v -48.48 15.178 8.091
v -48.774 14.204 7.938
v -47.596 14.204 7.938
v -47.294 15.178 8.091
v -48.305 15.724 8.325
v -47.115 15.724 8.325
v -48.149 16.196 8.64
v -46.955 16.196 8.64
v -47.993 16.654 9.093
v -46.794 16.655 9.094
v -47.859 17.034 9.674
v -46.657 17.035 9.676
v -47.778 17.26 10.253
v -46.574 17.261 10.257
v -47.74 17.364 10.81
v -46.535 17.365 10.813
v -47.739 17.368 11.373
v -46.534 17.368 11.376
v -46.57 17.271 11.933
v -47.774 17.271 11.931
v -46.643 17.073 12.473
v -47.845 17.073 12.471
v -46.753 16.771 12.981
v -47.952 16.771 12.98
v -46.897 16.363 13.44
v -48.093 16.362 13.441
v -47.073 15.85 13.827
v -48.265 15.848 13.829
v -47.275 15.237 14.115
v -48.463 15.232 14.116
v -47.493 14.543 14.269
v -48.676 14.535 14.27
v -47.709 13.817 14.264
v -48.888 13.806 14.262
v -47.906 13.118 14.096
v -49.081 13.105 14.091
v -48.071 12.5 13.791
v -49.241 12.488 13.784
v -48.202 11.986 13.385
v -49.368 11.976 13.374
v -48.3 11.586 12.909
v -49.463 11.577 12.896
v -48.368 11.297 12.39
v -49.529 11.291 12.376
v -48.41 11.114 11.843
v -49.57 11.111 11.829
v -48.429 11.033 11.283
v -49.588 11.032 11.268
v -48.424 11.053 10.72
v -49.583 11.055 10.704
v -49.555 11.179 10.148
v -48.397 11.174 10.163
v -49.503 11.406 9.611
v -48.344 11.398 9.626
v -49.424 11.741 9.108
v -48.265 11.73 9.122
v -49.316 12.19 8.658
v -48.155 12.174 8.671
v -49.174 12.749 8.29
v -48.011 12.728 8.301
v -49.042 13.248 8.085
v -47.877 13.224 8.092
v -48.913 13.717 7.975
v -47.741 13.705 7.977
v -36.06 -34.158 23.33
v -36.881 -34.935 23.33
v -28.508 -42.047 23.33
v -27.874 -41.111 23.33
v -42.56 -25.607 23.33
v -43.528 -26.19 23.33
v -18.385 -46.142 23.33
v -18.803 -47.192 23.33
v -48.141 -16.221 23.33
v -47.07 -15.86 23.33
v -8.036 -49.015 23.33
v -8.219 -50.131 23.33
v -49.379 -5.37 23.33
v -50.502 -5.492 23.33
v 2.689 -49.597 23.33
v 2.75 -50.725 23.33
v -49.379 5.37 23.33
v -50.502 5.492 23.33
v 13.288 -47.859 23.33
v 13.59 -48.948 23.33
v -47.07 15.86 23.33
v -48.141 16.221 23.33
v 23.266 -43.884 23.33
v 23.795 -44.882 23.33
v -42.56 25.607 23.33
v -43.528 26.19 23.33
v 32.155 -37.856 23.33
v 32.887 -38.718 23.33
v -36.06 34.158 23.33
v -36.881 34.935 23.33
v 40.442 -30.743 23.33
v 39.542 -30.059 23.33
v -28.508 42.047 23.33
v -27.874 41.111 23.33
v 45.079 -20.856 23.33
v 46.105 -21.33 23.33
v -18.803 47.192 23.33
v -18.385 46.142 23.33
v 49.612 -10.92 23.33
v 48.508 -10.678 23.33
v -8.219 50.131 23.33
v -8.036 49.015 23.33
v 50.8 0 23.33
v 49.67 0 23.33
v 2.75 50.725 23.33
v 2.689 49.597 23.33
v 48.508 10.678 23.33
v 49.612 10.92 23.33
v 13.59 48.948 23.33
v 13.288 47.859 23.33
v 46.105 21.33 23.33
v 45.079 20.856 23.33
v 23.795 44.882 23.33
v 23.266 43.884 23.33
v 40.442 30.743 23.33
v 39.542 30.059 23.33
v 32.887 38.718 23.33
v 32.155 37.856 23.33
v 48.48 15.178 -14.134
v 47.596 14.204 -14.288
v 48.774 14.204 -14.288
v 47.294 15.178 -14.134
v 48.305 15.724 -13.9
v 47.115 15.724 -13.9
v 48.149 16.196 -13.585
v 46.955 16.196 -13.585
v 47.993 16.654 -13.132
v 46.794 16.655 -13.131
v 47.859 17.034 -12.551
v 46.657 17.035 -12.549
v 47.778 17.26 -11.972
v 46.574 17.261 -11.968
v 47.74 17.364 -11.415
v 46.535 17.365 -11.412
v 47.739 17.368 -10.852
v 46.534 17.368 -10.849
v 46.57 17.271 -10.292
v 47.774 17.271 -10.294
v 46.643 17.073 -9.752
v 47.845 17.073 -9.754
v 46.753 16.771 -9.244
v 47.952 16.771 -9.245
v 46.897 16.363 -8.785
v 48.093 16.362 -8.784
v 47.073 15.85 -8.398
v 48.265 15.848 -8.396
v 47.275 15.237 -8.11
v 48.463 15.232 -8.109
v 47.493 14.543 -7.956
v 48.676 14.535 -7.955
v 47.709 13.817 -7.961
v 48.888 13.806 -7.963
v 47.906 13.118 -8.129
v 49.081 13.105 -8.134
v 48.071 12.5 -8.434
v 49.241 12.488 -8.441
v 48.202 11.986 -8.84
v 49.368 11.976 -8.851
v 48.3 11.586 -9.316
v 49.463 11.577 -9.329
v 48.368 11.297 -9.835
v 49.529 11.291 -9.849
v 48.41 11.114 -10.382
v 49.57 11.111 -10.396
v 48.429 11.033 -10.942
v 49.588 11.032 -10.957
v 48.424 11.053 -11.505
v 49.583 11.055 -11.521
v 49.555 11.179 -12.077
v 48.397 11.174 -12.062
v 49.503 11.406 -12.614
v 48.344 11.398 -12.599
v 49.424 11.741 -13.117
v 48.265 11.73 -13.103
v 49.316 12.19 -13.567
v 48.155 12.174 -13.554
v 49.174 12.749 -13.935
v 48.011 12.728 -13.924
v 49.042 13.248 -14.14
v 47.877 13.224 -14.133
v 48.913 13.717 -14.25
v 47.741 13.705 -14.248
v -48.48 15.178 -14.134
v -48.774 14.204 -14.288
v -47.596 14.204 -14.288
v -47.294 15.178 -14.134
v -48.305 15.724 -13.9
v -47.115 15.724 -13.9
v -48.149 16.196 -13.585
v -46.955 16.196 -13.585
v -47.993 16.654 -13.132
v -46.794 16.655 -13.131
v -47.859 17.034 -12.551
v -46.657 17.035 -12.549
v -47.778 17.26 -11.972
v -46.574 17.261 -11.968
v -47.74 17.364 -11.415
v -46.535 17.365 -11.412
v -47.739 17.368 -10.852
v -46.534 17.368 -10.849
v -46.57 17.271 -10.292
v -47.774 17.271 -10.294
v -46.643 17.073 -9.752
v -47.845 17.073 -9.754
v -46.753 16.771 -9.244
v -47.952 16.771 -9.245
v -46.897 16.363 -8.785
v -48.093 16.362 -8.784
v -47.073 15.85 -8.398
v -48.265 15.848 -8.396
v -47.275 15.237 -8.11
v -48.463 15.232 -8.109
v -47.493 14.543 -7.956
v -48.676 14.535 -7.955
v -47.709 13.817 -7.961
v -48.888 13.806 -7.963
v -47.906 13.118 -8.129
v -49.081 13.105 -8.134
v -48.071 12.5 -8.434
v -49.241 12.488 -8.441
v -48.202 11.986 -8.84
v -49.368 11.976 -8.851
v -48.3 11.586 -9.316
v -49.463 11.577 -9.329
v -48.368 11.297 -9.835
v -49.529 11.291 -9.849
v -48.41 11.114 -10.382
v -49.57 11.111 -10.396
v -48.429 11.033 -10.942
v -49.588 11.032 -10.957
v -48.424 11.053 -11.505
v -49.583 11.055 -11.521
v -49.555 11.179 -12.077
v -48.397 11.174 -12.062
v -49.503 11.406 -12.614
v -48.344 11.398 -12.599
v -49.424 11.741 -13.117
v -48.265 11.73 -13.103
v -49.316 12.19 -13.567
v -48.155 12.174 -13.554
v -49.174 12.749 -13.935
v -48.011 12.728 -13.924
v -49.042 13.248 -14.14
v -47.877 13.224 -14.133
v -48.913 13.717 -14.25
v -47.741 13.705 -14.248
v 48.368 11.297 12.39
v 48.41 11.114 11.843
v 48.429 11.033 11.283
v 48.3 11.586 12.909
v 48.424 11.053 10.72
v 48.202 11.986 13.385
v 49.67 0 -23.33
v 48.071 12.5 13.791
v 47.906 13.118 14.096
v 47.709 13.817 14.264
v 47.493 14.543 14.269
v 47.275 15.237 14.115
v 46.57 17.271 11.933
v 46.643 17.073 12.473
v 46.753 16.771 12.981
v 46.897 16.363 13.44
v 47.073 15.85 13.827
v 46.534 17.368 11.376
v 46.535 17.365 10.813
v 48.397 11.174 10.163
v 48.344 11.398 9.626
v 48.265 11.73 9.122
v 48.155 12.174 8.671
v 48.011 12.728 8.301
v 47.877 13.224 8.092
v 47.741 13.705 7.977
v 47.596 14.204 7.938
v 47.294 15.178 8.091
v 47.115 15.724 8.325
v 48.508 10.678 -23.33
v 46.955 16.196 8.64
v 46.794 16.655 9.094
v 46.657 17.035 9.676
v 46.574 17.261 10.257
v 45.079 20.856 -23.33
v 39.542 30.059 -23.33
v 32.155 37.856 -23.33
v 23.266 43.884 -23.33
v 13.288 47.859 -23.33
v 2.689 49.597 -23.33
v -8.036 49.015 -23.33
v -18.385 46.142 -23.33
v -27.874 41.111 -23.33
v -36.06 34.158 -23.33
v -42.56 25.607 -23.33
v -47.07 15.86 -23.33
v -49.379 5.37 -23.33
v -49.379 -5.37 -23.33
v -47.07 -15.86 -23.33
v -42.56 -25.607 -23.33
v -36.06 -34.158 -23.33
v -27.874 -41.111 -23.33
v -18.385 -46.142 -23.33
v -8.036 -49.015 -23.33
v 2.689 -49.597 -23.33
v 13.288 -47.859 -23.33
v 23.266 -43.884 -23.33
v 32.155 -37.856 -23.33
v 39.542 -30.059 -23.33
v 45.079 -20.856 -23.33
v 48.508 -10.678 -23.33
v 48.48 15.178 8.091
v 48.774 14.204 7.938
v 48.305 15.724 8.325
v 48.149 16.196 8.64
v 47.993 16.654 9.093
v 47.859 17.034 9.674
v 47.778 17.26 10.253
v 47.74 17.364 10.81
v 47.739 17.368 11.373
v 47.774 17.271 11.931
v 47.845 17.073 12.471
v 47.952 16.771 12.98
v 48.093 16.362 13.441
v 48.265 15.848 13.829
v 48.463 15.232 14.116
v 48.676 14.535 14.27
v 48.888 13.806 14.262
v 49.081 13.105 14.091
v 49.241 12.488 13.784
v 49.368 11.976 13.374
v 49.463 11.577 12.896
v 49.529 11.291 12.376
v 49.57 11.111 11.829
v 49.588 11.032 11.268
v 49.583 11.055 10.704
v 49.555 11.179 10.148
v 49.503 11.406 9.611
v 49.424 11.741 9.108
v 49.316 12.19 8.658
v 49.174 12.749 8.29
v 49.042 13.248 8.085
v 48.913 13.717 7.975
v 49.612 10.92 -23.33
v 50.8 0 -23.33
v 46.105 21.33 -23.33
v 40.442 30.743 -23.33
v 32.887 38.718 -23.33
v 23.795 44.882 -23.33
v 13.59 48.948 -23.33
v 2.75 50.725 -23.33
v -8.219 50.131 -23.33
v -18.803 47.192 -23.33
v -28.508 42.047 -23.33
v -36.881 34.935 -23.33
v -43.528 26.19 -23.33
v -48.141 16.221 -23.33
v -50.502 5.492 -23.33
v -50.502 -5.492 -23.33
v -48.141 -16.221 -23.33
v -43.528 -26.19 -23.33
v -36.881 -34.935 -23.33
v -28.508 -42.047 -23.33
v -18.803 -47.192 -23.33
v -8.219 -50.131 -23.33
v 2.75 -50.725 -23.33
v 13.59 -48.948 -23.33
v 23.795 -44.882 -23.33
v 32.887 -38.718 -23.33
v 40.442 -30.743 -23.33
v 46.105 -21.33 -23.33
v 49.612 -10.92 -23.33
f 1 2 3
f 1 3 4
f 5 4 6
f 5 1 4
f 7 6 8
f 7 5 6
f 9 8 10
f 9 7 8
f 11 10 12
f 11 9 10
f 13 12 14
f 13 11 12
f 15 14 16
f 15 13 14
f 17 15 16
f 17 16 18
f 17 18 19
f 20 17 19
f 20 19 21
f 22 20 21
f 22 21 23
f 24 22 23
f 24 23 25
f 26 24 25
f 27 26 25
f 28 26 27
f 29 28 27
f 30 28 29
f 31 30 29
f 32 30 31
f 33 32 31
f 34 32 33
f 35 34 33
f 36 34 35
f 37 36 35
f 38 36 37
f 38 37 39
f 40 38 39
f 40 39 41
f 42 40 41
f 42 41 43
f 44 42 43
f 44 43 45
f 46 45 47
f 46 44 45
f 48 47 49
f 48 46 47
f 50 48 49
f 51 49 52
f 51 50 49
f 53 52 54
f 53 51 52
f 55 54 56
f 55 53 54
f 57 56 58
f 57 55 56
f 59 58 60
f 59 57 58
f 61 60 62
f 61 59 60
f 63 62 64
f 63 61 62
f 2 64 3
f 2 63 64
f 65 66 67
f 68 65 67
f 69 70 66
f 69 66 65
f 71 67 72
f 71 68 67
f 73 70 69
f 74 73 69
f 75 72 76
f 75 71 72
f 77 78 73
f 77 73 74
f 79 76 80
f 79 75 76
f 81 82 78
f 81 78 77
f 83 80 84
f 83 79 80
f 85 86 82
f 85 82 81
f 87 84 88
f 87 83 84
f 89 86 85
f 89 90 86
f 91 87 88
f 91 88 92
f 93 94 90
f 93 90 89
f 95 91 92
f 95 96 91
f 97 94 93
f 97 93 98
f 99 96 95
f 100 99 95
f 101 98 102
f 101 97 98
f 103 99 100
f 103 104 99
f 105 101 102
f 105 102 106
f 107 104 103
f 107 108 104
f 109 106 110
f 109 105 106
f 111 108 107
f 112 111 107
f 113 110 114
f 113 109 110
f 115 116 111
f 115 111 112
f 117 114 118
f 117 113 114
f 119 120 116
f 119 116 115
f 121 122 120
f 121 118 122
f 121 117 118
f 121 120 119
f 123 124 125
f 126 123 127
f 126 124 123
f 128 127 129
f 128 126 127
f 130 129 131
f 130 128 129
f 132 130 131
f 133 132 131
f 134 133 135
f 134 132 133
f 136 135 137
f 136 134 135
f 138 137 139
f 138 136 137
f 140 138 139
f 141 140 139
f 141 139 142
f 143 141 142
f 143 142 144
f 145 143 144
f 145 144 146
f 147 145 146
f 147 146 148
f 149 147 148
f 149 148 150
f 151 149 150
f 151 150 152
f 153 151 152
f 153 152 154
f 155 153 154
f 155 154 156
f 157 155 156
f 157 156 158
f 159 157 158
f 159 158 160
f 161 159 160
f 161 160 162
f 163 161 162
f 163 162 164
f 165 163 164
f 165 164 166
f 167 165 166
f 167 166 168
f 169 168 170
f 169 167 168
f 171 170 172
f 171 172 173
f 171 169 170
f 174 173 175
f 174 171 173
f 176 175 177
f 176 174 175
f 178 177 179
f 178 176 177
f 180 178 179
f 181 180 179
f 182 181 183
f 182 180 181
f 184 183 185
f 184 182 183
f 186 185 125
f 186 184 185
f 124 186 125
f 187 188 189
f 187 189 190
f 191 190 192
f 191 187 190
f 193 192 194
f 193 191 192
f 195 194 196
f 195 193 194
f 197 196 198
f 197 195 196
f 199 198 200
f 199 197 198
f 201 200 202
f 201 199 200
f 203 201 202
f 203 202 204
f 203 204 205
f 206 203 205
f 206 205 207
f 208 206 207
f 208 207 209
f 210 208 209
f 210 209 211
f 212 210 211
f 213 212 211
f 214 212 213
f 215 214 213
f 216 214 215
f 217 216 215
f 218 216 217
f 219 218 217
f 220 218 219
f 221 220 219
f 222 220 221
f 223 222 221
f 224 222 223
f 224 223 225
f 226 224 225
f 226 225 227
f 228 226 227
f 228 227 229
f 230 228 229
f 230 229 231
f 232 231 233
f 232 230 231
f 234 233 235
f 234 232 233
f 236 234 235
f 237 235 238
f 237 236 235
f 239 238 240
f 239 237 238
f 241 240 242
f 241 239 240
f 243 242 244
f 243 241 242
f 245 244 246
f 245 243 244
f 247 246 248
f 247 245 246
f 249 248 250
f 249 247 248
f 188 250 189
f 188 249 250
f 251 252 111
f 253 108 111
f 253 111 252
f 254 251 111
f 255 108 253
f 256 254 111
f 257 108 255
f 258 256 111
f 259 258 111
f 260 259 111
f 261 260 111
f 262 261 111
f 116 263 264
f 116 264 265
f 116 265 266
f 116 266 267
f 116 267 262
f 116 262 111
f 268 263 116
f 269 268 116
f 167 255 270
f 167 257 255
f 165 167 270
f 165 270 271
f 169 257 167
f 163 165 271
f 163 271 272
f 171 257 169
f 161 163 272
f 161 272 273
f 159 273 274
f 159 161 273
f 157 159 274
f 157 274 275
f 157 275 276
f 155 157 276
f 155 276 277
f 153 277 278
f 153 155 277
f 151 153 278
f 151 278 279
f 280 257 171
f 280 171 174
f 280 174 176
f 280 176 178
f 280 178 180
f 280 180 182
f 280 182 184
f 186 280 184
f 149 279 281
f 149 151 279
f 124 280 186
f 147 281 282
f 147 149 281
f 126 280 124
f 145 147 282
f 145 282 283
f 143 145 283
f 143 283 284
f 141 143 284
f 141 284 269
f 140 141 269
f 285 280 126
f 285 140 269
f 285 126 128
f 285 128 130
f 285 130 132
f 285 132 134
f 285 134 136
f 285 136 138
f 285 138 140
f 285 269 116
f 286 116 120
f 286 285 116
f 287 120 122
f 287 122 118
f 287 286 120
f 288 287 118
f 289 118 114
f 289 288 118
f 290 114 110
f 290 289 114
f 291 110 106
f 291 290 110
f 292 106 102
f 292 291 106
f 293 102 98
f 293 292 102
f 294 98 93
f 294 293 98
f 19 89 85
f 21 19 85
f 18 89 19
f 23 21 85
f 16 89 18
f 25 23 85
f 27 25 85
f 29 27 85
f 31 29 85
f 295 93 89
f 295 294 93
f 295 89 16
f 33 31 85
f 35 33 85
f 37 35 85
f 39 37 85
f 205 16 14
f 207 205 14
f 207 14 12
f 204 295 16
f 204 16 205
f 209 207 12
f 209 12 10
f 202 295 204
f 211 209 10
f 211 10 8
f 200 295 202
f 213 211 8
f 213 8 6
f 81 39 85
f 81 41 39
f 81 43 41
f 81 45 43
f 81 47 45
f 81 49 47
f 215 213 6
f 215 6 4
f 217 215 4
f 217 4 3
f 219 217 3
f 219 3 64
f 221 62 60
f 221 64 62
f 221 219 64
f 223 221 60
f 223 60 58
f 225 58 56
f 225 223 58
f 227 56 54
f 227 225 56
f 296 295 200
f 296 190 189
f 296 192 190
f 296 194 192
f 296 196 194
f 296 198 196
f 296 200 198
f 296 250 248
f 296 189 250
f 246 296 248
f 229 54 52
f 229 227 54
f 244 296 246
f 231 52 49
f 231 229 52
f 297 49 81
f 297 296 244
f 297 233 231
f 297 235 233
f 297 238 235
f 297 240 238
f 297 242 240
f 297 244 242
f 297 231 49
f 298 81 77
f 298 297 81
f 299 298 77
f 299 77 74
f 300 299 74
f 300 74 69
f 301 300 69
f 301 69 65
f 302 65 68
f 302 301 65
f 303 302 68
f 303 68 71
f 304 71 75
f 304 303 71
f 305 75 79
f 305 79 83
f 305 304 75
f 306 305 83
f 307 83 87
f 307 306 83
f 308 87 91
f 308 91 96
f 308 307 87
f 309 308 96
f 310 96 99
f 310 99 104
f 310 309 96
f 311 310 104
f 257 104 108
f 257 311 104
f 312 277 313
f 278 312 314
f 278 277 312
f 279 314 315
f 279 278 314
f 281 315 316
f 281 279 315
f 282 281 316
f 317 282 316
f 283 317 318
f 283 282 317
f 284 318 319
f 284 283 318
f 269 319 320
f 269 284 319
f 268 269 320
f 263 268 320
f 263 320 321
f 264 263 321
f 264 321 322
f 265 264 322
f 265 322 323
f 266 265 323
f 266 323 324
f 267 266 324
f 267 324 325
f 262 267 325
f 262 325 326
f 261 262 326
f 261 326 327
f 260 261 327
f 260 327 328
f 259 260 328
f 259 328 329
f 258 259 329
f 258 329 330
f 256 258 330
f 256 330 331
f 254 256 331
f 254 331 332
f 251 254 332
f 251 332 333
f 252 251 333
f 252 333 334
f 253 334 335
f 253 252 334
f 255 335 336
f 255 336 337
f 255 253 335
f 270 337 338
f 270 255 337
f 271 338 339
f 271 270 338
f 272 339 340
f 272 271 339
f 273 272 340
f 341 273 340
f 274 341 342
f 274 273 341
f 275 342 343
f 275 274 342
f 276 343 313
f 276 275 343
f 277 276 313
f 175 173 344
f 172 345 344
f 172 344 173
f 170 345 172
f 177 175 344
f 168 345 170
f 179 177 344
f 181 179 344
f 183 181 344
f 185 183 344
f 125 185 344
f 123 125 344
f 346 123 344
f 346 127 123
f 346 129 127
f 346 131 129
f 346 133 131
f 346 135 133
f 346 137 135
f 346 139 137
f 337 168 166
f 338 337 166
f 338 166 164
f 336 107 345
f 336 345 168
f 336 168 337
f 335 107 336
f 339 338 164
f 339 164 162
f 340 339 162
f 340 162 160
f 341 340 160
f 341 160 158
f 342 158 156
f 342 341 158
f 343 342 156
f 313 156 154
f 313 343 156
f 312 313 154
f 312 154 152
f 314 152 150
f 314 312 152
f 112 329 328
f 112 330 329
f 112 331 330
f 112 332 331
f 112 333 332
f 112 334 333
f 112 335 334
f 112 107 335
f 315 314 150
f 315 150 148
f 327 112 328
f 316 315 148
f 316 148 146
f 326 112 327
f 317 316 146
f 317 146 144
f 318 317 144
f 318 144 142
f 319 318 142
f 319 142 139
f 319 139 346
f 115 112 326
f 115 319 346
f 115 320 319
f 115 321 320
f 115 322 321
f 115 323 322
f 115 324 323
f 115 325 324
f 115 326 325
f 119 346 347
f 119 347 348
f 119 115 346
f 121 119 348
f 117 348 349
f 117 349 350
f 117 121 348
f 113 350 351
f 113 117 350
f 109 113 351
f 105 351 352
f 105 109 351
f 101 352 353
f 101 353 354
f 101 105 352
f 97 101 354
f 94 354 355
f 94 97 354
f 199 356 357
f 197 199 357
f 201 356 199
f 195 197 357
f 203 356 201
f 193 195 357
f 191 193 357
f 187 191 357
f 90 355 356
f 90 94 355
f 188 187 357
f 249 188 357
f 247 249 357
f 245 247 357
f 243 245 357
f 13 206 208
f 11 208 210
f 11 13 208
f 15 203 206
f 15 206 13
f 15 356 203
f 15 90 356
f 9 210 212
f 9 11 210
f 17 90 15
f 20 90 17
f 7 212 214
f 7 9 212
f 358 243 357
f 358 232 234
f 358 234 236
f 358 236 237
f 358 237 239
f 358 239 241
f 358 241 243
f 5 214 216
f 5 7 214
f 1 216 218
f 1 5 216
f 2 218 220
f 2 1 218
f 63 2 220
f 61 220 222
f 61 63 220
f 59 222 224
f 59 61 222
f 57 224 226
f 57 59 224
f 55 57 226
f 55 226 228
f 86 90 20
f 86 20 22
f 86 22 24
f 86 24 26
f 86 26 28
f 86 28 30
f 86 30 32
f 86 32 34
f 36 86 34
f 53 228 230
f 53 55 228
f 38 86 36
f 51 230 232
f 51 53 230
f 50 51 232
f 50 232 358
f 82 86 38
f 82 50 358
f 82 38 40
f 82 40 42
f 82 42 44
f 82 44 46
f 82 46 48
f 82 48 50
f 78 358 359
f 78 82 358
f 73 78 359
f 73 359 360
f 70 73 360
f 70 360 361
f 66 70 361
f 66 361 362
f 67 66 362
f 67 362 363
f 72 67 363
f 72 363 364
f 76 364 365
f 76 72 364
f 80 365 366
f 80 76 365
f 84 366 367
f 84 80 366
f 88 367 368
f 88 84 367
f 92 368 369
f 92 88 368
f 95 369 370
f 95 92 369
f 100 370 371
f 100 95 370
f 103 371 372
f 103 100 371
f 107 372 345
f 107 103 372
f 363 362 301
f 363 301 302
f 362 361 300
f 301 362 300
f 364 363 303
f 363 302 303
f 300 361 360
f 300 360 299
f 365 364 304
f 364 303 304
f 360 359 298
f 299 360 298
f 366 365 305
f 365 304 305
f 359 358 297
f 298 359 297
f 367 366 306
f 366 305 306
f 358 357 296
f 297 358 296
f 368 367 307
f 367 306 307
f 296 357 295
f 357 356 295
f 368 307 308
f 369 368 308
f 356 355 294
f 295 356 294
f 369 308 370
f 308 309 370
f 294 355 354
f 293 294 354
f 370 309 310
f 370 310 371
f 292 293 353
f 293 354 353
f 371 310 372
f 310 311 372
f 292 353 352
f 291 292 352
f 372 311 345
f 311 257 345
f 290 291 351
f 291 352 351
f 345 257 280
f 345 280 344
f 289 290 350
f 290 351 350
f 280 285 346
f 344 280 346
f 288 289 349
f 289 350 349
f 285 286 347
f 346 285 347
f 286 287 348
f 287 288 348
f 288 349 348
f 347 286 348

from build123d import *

# Parameters (mm, degrees)
SKETCH1_R               = 50.8
SKETCH1_R_2             = 49.6697
BOSS_EXTRUDE1_DEPTH     = 23.3299
CUT_EXTRUDE1_DEPTH      = 76.535185404
CUT_EXTRUDE1_DEPTH_BACK = 76.535185404
SKETCH2_R               = 3.175


with BuildPart() as part:
    # Sketch1 → Boss-Extrude1 (new, symmetric)
    with BuildSketch(Plane.XY):
        Circle(SKETCH1_R)
        Circle(SKETCH1_R_2, mode=Mode.SUBTRACT)
    extrude(amount=BOSS_EXTRUDE1_DEPTH, both=True)

    # Sketch2 → Cut-Extrude1 (cut, two sides: drawn at the far end of the back side and taken through both)
    with BuildSketch(Plane(origin=(0, 0, 0), x_dir=(0, 0, -1), z_dir=(1, 0, 0)).offset(-CUT_EXTRUDE1_DEPTH_BACK)):
        with Locations((-11.1125, 14.20368)):
            Circle(SKETCH2_R)
        with Locations((11.1125, 14.20368)):
            Circle(SKETCH2_R)
    extrude(amount=CUT_EXTRUDE1_DEPTH + CUT_EXTRUDE1_DEPTH_BACK, mode=Mode.SUBTRACT)


solid = part.part
